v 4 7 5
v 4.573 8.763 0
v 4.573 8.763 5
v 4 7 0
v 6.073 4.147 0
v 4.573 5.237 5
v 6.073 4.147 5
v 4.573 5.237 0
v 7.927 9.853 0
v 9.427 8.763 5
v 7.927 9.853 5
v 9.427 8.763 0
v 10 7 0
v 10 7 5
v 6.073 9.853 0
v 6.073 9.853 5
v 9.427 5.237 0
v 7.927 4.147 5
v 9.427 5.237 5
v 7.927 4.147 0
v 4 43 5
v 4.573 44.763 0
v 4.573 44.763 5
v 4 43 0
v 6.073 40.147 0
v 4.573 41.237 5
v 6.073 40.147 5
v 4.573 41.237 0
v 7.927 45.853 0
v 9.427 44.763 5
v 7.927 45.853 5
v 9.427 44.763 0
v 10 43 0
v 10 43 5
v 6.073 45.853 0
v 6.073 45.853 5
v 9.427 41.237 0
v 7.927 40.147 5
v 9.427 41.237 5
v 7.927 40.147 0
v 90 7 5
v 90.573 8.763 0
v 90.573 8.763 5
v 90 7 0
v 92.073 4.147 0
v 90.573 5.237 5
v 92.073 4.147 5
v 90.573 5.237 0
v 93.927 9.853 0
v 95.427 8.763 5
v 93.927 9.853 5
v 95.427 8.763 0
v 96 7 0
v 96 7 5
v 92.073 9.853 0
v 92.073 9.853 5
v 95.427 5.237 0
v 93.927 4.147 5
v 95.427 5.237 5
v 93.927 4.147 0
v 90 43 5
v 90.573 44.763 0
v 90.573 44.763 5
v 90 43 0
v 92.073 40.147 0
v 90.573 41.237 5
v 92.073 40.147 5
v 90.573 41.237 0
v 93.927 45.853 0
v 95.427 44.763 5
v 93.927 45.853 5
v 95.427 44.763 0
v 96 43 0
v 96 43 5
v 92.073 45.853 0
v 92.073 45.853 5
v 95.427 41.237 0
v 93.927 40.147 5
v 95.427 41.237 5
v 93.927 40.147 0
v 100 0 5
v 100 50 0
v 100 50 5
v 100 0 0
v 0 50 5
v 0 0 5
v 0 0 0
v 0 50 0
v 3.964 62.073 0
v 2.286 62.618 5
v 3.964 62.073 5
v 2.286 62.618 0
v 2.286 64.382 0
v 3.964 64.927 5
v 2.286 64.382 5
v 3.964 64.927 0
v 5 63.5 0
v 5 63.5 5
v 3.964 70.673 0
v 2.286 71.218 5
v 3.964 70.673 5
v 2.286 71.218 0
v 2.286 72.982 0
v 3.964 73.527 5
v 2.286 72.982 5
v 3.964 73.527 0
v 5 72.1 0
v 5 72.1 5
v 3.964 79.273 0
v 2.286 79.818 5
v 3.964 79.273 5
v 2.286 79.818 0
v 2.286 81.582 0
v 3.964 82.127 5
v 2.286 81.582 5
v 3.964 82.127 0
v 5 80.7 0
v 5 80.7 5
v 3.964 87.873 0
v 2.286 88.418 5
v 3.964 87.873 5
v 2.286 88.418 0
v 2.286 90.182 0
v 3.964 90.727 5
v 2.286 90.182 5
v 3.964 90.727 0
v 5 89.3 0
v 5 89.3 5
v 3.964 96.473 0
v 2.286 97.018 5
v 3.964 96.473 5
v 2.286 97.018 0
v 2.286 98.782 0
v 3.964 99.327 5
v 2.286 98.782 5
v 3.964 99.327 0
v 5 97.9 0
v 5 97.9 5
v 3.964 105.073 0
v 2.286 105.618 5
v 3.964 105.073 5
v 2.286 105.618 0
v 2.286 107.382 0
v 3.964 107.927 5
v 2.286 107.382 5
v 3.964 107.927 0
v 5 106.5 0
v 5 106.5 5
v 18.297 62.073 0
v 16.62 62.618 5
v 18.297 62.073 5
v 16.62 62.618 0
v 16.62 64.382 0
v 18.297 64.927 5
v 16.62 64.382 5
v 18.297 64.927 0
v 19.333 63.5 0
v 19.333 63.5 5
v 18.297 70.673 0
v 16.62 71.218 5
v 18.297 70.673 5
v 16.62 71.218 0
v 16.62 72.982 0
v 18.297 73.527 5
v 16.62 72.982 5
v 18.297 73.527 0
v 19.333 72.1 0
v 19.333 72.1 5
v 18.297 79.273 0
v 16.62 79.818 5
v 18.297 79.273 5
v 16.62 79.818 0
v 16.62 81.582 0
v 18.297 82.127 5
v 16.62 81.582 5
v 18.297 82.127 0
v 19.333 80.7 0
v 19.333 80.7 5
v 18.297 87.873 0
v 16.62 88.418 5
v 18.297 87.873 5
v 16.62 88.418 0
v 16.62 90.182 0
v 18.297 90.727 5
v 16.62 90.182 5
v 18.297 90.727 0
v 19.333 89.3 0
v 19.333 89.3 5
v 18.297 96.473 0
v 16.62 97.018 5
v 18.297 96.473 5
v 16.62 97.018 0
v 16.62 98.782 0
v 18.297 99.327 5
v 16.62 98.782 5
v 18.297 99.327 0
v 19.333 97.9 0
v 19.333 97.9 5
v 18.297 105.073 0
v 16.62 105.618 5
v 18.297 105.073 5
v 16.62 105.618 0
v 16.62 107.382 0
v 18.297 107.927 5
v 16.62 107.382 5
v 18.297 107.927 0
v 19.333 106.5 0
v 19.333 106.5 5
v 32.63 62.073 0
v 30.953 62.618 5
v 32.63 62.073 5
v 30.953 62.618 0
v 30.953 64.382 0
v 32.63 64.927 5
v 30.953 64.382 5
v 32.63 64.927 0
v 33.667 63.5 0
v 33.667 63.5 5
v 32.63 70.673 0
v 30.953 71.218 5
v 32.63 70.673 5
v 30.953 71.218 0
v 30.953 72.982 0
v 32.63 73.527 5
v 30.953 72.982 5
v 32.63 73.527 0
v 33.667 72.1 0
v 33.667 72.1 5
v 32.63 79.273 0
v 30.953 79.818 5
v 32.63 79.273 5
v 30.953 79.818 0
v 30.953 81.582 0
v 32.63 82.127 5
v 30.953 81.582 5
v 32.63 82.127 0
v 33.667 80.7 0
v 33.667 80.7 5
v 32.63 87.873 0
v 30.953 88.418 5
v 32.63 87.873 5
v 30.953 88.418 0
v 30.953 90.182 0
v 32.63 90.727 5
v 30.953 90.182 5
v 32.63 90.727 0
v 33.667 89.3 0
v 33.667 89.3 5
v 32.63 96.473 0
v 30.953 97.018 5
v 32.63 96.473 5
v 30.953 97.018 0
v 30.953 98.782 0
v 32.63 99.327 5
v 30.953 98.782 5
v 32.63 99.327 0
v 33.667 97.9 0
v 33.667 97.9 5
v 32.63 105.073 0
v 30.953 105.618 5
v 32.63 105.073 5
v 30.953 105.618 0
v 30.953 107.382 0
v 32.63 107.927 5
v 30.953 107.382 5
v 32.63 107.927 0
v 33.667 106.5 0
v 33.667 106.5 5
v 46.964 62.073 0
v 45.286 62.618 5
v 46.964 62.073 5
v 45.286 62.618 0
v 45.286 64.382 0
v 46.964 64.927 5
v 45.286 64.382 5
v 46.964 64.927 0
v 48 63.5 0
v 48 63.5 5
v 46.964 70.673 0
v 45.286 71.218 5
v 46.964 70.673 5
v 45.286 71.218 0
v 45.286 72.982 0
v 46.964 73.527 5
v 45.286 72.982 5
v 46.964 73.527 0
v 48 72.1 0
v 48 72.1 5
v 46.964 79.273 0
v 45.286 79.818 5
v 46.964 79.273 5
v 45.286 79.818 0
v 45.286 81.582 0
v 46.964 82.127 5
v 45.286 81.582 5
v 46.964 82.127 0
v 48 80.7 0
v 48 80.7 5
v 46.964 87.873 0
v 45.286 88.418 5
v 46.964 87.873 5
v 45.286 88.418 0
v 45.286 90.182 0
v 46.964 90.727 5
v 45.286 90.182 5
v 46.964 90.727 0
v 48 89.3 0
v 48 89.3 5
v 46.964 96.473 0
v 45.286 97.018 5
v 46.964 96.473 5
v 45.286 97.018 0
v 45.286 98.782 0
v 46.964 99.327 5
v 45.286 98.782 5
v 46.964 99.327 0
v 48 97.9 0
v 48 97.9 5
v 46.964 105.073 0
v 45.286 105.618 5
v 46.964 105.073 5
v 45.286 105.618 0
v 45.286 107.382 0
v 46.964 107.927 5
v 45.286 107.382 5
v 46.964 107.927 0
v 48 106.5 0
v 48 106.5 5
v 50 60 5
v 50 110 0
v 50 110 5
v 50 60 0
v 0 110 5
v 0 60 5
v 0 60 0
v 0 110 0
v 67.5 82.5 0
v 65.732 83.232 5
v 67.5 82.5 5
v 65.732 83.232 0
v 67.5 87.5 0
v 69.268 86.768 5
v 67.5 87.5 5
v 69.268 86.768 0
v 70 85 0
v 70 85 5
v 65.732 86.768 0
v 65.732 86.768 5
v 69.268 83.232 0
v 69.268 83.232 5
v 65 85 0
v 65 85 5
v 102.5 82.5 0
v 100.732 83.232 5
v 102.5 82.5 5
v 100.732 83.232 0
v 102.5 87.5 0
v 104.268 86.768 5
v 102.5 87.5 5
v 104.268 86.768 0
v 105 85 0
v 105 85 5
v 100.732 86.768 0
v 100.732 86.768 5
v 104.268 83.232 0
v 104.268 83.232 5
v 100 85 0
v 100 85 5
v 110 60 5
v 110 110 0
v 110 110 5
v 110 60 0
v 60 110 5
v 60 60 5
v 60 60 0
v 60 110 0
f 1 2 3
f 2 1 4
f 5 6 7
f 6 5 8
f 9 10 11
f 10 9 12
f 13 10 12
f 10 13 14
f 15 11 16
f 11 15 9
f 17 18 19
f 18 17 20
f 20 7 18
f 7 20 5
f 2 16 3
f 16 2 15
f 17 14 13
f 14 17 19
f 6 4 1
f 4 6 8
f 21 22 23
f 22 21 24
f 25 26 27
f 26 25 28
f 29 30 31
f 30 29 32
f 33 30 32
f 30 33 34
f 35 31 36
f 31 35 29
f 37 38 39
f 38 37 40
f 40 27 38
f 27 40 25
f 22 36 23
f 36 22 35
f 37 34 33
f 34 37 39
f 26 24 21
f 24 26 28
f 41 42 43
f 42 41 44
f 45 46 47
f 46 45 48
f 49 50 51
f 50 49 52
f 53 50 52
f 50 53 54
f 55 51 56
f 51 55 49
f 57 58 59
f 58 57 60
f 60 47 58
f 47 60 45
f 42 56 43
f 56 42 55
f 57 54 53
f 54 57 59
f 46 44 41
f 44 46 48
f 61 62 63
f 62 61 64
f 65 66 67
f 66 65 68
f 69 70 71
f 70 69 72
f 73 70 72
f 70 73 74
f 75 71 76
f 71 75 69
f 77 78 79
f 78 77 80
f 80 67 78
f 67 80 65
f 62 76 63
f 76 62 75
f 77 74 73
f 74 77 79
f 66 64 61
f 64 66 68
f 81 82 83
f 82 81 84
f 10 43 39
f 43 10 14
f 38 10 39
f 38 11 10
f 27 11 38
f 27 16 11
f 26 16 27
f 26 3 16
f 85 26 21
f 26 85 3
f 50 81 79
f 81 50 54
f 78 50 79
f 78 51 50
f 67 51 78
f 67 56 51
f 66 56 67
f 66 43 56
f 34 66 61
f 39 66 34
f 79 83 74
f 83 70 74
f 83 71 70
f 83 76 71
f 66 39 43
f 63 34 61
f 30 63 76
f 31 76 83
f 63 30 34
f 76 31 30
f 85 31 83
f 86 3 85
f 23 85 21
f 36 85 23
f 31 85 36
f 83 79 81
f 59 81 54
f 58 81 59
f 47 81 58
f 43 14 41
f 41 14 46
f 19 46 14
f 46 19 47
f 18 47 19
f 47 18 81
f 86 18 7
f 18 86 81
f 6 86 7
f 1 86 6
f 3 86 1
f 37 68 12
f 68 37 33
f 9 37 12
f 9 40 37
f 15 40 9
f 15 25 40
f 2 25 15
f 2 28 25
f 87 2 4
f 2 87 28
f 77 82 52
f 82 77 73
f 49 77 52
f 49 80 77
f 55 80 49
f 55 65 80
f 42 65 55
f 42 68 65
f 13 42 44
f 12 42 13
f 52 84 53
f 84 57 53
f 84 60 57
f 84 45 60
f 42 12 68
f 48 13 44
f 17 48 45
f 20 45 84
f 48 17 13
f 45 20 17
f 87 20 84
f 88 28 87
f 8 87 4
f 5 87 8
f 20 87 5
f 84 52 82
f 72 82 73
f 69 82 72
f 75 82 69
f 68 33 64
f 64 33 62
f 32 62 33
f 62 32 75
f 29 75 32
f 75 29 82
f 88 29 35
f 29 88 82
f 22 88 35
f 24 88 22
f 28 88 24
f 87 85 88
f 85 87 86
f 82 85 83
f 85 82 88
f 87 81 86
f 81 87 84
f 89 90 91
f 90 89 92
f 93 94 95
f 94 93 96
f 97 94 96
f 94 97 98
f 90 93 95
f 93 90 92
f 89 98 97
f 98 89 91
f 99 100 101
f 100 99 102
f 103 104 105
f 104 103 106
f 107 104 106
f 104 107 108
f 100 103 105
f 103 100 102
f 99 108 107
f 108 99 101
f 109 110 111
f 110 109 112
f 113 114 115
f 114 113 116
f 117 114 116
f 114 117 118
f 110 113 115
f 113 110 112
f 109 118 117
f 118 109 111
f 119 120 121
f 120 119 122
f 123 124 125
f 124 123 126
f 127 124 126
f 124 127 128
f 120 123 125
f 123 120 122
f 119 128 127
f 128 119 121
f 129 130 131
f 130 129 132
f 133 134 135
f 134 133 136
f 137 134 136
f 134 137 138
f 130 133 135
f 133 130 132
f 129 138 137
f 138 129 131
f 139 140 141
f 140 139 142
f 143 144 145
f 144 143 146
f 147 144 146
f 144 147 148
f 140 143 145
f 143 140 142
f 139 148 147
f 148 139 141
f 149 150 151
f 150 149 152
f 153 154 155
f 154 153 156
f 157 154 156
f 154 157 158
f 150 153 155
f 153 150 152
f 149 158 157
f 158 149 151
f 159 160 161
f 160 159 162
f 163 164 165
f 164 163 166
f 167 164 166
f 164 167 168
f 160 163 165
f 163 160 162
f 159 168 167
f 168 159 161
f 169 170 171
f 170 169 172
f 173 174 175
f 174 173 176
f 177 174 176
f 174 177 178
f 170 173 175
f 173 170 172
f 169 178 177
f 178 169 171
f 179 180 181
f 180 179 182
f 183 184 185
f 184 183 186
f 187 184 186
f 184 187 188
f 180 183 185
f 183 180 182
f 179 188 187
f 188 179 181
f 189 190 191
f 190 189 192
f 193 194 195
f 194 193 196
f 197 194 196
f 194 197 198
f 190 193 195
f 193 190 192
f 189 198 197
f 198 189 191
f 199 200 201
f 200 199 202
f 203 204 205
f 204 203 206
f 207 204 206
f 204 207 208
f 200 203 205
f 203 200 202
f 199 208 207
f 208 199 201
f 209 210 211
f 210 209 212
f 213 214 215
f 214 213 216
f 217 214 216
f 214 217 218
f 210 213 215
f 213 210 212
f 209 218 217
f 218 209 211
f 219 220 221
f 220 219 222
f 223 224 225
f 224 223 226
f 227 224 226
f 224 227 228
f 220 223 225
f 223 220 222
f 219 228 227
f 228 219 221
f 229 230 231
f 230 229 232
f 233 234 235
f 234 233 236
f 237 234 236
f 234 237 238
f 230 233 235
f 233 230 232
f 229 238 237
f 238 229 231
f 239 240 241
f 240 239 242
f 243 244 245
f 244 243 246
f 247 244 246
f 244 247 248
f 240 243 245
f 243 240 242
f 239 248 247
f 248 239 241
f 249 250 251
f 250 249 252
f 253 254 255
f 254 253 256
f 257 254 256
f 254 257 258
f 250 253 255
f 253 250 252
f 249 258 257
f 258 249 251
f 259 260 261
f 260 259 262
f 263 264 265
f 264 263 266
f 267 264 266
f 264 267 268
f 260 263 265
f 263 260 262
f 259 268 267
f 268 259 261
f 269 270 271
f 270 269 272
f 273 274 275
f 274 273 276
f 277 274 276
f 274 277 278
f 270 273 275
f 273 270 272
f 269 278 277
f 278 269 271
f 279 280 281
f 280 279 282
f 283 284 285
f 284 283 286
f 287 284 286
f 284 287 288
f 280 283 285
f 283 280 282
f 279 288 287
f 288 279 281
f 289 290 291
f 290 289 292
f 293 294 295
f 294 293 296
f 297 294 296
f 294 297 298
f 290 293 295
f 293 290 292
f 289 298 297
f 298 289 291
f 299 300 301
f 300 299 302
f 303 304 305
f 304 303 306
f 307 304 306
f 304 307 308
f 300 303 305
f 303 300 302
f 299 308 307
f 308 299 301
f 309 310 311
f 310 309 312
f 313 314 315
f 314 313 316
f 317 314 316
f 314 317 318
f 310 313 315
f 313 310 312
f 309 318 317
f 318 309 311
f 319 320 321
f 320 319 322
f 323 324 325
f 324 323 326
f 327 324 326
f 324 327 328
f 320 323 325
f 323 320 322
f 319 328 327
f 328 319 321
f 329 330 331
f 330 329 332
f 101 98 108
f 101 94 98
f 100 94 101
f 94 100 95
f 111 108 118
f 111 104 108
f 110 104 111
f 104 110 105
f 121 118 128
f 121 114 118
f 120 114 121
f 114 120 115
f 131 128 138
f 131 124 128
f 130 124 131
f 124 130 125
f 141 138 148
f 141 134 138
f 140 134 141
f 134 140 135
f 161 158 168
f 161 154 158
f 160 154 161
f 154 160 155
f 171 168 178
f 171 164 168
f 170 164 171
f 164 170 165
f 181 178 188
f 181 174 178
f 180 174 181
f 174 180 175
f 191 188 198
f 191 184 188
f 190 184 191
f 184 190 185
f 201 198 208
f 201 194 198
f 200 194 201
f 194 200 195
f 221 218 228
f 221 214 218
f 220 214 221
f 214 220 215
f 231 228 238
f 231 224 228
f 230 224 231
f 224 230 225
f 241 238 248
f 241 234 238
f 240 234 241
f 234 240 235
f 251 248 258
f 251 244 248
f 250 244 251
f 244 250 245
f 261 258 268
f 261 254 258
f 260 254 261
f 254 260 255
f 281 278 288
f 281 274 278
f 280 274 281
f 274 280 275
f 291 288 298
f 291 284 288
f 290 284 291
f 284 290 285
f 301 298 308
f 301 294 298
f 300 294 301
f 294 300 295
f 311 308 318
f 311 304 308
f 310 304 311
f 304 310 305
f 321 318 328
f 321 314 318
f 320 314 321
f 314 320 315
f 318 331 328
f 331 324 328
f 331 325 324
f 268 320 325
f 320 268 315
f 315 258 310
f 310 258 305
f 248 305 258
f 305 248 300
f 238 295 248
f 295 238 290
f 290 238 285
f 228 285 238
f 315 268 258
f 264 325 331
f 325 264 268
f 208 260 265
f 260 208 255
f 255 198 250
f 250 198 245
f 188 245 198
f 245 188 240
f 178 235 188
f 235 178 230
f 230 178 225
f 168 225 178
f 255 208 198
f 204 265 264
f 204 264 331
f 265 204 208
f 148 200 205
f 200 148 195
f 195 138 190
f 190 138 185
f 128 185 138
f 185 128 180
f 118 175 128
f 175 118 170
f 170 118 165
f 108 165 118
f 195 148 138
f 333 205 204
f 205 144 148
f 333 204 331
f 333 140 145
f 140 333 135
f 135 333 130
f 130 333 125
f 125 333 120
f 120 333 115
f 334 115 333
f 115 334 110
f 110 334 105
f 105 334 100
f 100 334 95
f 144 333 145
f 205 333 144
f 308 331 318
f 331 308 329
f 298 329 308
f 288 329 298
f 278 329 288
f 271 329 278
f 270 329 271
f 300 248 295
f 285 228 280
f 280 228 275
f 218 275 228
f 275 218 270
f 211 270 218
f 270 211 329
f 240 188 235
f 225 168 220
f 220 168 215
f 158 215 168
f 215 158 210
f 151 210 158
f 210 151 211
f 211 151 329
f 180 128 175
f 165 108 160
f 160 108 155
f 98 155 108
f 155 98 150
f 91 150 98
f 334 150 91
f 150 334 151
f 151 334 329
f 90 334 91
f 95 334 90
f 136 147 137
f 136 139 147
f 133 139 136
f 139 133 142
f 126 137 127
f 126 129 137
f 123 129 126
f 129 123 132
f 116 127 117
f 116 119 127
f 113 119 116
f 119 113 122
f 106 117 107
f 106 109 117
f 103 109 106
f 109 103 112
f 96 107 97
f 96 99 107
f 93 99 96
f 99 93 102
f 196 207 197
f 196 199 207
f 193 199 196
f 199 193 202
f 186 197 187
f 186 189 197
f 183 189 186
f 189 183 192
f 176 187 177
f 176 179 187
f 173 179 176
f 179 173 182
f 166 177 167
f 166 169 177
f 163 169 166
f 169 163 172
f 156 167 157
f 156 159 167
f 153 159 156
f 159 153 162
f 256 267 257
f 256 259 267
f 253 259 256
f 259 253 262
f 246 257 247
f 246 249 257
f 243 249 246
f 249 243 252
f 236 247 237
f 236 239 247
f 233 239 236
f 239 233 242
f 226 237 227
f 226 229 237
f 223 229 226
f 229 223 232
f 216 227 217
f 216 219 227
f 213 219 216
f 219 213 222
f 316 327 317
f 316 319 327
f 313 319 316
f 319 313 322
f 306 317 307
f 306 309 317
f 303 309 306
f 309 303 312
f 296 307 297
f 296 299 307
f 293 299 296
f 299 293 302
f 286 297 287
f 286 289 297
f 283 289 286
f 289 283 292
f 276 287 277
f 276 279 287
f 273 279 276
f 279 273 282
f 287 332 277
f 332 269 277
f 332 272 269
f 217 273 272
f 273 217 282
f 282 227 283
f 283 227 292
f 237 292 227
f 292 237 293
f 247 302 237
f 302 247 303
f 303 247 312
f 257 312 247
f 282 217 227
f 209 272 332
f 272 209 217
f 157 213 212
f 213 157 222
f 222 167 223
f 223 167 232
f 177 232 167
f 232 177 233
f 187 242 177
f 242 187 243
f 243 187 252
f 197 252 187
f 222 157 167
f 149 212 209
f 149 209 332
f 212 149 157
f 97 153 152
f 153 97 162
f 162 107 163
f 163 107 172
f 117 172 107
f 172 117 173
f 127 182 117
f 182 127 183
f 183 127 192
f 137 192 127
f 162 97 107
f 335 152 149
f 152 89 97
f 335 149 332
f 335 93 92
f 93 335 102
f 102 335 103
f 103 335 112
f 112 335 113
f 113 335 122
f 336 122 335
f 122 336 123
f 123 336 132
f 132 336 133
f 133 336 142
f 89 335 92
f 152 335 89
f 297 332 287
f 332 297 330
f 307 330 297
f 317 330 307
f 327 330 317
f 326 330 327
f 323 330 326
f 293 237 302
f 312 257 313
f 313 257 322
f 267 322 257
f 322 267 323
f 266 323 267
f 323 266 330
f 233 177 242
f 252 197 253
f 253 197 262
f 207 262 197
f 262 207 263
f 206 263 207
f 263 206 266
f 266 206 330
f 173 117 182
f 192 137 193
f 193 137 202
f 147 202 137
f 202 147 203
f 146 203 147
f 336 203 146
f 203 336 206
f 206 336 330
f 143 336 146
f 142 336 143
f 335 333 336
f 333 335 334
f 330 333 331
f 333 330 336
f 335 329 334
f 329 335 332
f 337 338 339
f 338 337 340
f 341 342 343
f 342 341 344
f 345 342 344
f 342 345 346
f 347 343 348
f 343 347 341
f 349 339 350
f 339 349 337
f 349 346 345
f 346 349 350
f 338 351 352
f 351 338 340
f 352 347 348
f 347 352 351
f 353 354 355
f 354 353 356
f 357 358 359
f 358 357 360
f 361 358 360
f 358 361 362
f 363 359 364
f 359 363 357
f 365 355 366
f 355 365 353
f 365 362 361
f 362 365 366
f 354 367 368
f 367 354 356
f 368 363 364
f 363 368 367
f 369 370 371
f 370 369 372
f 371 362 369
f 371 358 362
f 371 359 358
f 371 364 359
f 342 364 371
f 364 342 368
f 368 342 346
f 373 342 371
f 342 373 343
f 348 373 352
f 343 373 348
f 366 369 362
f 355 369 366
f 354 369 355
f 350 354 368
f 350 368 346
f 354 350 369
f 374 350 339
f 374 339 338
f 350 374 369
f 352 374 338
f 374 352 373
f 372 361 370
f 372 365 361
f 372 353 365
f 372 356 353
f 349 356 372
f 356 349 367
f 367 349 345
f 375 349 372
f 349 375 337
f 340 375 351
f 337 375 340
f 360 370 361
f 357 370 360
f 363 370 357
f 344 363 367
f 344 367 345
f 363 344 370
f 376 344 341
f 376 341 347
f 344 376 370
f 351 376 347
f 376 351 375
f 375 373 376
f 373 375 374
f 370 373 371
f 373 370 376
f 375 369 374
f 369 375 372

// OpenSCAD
/*
    globals
*/
epsilon = 0.1;
loop_epsilon = 0.1;

module hole_plate( size, hole_diameter, hole_margin, hole_count = [ 2, 2 ] )
{
    if( hole_count.x == 0 || hole_count.y == 0 )
    {
        cube( size );
    }
    else
    {
        difference()
        {
            cube( size );

            hole_centre_from_edge = hole_margin + hole_diameter / 2;

            x_hole_dist = hole_count.x > 1 ? ( size.x - 2 * hole_centre_from_edge ) / ( hole_count.x - 1 ) : 0;
            y_hole_dist = hole_count.y > 1 ? ( size.y - 2 * hole_centre_from_edge ) / ( hole_count.y - 1 ) : 0;
            x_values = hole_count.x > 1 ? [hole_centre_from_edge:x_hole_dist:size.x - hole_centre_from_edge + loop_epsilon] : [size.x / 2];
            y_values = hole_count.y > 1 ? [hole_centre_from_edge:y_hole_dist:size.y - hole_centre_from_edge + loop_epsilon] : [size.y / 2];

            // holes
            for( x = x_values, y = y_values )
            {
                translate( [ x, y, size.z / 2 ] )
                {
                    color( "red" ) { cylinder( h = size.z + epsilon, d = hole_diameter, center = true ); }
                }
            }
        }
    }
}

hole_plate( [ 100, 50, 5 ], 6, 4 );
translate( [ 0, 60, 0 ] ) { hole_plate( size = [ 50, 50, 5 ], hole_diameter = 3, hole_margin = 2, hole_count = [ 4, 6 ] ); }
translate( [ 60, 60, 0 ] ) { hole_plate( [ 50, 50, 5 ], hole_diameter = 5, hole_margin = 5, hole_count = [ 2, 1 ] ); }
